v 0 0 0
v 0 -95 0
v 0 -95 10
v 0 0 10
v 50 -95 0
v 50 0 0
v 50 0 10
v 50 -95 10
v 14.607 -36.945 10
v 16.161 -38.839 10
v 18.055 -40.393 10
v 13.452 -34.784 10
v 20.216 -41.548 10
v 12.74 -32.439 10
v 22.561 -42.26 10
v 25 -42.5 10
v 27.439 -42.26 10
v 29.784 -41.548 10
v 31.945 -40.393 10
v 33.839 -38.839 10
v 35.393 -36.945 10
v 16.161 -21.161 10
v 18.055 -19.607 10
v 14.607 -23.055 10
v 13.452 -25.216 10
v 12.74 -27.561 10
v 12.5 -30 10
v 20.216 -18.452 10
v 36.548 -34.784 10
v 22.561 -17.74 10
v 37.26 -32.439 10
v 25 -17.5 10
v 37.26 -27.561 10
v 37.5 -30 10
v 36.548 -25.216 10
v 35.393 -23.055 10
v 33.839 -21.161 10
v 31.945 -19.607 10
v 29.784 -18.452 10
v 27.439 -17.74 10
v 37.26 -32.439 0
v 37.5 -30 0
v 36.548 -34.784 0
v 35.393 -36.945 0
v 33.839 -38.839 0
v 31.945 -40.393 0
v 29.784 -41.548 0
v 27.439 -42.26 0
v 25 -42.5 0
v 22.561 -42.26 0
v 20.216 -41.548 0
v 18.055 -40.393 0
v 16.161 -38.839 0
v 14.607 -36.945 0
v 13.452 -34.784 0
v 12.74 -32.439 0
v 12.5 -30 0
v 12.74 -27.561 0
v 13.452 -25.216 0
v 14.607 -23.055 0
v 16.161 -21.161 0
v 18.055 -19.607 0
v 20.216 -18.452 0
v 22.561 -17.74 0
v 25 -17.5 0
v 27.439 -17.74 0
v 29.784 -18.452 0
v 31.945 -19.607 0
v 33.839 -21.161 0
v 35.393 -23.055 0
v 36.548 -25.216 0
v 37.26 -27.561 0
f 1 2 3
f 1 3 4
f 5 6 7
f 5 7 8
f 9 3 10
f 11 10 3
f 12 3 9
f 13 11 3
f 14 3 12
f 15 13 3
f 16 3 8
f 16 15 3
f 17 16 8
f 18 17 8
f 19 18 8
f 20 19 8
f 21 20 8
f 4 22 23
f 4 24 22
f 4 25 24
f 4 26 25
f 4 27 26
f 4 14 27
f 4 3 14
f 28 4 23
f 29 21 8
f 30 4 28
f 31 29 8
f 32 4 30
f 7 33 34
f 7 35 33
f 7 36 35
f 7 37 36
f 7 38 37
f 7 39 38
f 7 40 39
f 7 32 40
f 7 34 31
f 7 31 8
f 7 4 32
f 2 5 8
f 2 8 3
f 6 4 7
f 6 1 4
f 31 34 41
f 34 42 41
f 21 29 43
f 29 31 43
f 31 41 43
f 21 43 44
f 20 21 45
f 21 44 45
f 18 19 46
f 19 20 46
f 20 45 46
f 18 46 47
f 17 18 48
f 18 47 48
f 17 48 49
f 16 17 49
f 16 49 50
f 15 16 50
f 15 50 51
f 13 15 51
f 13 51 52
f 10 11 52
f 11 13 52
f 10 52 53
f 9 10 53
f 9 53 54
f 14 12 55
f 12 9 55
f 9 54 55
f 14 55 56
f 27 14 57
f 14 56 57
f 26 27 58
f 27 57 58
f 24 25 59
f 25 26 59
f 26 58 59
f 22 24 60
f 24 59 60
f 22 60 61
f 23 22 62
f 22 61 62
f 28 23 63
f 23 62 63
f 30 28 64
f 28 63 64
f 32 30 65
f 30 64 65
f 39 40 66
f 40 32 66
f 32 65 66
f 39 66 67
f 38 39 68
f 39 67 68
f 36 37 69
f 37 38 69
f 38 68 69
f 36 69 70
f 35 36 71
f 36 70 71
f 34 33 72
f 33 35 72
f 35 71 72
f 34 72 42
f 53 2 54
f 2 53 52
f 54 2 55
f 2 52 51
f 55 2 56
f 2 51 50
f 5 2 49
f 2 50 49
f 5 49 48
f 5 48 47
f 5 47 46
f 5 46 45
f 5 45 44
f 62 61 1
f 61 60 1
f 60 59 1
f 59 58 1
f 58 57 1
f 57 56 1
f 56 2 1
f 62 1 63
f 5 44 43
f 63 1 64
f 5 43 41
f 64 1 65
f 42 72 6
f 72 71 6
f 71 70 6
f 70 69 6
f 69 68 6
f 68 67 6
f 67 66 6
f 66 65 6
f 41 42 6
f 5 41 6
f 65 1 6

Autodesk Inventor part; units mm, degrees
ref_plane "YZ Plane" through (0, 0, 0) normal (1, 0, 0) x (0, 1, 0)
ref_plane "XZ Plane" through (0, 0, 0) normal (0, 1, 0) x (-1, 0, 0)
ref_plane "XY Plane" through (0, 0, 0) normal (0, 0, 1) x (1, 0, 0)
sketch "Boceto1" plane through (0, 0, 0) normal (0, 0, 1) x (1, 0, 0)
  line L0 (0, 0) -> (50, 0)
  line L1 (50, 0) -> (50, -95)
  line L2 (50, -95) -> (0, -95)
  line L3 (0, -95) -> (0, 0)
  circle A0 centre (25, -30) radius 12.5
  dimension "d0" = 50
  dimension "d1" = 95
  dimension "d2" = 25
extrude "Extrusión1" add sketch "Boceto1" along normal blind 10
properties part number "BaseM"
